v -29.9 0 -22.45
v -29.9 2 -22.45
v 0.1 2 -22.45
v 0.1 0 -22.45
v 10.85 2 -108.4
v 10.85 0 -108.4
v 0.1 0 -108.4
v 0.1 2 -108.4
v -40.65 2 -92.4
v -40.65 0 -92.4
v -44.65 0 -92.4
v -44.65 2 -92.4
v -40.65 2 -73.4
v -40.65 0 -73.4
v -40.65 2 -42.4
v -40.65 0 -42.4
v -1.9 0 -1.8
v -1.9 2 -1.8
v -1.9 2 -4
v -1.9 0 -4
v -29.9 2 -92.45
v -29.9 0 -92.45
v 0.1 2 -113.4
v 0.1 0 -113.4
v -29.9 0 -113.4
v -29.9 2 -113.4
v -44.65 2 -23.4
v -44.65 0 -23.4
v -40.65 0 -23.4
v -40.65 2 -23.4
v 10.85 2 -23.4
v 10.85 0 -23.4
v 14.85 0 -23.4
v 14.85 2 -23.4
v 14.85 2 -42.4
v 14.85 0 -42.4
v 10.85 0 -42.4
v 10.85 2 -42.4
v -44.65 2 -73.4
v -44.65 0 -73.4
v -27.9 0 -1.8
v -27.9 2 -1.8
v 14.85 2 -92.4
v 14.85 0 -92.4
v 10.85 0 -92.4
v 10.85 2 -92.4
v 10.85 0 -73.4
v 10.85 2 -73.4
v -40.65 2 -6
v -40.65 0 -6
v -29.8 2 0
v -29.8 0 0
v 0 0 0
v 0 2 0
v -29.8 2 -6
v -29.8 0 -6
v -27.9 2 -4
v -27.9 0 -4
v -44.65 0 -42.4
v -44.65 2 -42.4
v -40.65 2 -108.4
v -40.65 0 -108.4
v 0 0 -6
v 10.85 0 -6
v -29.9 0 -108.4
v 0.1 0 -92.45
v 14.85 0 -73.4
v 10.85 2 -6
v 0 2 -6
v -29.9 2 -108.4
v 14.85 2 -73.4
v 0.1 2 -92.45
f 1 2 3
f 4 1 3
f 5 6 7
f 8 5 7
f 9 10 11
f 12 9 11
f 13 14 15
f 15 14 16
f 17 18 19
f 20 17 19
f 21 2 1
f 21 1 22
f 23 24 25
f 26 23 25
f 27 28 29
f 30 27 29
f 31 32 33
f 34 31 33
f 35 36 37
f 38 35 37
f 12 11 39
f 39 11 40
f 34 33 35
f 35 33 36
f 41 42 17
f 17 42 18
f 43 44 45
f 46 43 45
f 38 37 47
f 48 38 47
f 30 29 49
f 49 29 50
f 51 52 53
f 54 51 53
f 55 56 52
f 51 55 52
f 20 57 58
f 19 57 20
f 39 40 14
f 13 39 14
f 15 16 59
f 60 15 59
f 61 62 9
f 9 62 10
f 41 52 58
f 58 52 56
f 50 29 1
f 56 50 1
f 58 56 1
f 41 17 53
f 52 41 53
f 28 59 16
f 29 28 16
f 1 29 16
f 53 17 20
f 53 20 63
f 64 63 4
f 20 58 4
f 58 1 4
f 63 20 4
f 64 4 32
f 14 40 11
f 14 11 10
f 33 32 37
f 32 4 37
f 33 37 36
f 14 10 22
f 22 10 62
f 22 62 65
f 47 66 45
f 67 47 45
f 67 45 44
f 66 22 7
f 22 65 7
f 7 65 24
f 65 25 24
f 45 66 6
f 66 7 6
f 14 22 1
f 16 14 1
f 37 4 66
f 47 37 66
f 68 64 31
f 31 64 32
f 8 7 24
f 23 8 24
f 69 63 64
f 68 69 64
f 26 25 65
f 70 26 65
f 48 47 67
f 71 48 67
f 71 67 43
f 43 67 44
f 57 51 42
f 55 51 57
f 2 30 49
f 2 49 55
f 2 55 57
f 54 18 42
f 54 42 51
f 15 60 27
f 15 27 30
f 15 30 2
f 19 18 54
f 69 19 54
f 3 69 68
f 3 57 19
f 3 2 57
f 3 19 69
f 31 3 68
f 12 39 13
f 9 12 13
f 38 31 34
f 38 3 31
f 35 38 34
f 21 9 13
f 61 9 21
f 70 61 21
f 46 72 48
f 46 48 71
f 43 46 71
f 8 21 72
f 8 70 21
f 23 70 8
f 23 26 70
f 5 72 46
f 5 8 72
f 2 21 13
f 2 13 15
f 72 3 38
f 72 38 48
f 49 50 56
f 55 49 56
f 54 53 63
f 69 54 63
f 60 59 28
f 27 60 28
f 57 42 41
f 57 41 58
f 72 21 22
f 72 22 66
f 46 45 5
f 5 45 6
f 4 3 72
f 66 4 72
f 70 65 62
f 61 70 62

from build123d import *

# Parameters (mm, degrees)
AUFSATZ_LINEAR_AUSTRAGEN2_DEPTH = 2
SKIZZE4_W                       = 30
SKIZZE4_H                       = 70
SKIZZE4_W_2                     = 26
SKIZZE4_H_2                     = 2.2
SCHNITT_LINEAR_AUSTRAGEN1_DEPTH = 2


with BuildPart() as part:
    # Skizze3 → Aufsatz-Linear austragen2 (new body)
    with BuildSketch(Plane(origin=(0, 0, 0), x_dir=(1, 0, 0), z_dir=(0, 1, 0))):
        Polygon((-29.8, 0), (0, 0), (0, 6), (10.85, 6), (10.85, 23.4), (14.85, 23.4), (14.85, 42.4), (10.85, 42.4), (10.85, 73.4), (14.85, 73.4), (14.85, 92.4), (10.85, 92.4), (10.85, 108.4), (0.1, 108.4), (0.1, 113.4), (-29.9, 113.4), (-29.9, 108.4), (-40.65, 108.4), (-40.65, 92.4), (-44.65, 92.4), (-44.65, 73.4), (-40.65, 73.4), (-40.65, 42.4), (-44.65, 42.4), (-44.65, 23.4), (-40.65, 23.4), (-40.65, 6), (-29.8, 6), align=None)
    extrude(amount=AUFSATZ_LINEAR_AUSTRAGEN2_DEPTH)

    # Skizze4 → Schnitt-Linear austragen1 (cut)
    with BuildSketch(Plane(origin=(0, 2, 0), x_dir=(1, 0, 0), z_dir=(0, 1, 0))):
        with Locations((-14.9, 57.449848024)):
            Rectangle(SKIZZE4_W, SKIZZE4_H)
        with Locations((-14.9, 2.9)):
            Rectangle(SKIZZE4_W_2, SKIZZE4_H_2)
    extrude(amount=-SCHNITT_LINEAR_AUSTRAGEN1_DEPTH, mode=Mode.SUBTRACT)


solid = part.part
